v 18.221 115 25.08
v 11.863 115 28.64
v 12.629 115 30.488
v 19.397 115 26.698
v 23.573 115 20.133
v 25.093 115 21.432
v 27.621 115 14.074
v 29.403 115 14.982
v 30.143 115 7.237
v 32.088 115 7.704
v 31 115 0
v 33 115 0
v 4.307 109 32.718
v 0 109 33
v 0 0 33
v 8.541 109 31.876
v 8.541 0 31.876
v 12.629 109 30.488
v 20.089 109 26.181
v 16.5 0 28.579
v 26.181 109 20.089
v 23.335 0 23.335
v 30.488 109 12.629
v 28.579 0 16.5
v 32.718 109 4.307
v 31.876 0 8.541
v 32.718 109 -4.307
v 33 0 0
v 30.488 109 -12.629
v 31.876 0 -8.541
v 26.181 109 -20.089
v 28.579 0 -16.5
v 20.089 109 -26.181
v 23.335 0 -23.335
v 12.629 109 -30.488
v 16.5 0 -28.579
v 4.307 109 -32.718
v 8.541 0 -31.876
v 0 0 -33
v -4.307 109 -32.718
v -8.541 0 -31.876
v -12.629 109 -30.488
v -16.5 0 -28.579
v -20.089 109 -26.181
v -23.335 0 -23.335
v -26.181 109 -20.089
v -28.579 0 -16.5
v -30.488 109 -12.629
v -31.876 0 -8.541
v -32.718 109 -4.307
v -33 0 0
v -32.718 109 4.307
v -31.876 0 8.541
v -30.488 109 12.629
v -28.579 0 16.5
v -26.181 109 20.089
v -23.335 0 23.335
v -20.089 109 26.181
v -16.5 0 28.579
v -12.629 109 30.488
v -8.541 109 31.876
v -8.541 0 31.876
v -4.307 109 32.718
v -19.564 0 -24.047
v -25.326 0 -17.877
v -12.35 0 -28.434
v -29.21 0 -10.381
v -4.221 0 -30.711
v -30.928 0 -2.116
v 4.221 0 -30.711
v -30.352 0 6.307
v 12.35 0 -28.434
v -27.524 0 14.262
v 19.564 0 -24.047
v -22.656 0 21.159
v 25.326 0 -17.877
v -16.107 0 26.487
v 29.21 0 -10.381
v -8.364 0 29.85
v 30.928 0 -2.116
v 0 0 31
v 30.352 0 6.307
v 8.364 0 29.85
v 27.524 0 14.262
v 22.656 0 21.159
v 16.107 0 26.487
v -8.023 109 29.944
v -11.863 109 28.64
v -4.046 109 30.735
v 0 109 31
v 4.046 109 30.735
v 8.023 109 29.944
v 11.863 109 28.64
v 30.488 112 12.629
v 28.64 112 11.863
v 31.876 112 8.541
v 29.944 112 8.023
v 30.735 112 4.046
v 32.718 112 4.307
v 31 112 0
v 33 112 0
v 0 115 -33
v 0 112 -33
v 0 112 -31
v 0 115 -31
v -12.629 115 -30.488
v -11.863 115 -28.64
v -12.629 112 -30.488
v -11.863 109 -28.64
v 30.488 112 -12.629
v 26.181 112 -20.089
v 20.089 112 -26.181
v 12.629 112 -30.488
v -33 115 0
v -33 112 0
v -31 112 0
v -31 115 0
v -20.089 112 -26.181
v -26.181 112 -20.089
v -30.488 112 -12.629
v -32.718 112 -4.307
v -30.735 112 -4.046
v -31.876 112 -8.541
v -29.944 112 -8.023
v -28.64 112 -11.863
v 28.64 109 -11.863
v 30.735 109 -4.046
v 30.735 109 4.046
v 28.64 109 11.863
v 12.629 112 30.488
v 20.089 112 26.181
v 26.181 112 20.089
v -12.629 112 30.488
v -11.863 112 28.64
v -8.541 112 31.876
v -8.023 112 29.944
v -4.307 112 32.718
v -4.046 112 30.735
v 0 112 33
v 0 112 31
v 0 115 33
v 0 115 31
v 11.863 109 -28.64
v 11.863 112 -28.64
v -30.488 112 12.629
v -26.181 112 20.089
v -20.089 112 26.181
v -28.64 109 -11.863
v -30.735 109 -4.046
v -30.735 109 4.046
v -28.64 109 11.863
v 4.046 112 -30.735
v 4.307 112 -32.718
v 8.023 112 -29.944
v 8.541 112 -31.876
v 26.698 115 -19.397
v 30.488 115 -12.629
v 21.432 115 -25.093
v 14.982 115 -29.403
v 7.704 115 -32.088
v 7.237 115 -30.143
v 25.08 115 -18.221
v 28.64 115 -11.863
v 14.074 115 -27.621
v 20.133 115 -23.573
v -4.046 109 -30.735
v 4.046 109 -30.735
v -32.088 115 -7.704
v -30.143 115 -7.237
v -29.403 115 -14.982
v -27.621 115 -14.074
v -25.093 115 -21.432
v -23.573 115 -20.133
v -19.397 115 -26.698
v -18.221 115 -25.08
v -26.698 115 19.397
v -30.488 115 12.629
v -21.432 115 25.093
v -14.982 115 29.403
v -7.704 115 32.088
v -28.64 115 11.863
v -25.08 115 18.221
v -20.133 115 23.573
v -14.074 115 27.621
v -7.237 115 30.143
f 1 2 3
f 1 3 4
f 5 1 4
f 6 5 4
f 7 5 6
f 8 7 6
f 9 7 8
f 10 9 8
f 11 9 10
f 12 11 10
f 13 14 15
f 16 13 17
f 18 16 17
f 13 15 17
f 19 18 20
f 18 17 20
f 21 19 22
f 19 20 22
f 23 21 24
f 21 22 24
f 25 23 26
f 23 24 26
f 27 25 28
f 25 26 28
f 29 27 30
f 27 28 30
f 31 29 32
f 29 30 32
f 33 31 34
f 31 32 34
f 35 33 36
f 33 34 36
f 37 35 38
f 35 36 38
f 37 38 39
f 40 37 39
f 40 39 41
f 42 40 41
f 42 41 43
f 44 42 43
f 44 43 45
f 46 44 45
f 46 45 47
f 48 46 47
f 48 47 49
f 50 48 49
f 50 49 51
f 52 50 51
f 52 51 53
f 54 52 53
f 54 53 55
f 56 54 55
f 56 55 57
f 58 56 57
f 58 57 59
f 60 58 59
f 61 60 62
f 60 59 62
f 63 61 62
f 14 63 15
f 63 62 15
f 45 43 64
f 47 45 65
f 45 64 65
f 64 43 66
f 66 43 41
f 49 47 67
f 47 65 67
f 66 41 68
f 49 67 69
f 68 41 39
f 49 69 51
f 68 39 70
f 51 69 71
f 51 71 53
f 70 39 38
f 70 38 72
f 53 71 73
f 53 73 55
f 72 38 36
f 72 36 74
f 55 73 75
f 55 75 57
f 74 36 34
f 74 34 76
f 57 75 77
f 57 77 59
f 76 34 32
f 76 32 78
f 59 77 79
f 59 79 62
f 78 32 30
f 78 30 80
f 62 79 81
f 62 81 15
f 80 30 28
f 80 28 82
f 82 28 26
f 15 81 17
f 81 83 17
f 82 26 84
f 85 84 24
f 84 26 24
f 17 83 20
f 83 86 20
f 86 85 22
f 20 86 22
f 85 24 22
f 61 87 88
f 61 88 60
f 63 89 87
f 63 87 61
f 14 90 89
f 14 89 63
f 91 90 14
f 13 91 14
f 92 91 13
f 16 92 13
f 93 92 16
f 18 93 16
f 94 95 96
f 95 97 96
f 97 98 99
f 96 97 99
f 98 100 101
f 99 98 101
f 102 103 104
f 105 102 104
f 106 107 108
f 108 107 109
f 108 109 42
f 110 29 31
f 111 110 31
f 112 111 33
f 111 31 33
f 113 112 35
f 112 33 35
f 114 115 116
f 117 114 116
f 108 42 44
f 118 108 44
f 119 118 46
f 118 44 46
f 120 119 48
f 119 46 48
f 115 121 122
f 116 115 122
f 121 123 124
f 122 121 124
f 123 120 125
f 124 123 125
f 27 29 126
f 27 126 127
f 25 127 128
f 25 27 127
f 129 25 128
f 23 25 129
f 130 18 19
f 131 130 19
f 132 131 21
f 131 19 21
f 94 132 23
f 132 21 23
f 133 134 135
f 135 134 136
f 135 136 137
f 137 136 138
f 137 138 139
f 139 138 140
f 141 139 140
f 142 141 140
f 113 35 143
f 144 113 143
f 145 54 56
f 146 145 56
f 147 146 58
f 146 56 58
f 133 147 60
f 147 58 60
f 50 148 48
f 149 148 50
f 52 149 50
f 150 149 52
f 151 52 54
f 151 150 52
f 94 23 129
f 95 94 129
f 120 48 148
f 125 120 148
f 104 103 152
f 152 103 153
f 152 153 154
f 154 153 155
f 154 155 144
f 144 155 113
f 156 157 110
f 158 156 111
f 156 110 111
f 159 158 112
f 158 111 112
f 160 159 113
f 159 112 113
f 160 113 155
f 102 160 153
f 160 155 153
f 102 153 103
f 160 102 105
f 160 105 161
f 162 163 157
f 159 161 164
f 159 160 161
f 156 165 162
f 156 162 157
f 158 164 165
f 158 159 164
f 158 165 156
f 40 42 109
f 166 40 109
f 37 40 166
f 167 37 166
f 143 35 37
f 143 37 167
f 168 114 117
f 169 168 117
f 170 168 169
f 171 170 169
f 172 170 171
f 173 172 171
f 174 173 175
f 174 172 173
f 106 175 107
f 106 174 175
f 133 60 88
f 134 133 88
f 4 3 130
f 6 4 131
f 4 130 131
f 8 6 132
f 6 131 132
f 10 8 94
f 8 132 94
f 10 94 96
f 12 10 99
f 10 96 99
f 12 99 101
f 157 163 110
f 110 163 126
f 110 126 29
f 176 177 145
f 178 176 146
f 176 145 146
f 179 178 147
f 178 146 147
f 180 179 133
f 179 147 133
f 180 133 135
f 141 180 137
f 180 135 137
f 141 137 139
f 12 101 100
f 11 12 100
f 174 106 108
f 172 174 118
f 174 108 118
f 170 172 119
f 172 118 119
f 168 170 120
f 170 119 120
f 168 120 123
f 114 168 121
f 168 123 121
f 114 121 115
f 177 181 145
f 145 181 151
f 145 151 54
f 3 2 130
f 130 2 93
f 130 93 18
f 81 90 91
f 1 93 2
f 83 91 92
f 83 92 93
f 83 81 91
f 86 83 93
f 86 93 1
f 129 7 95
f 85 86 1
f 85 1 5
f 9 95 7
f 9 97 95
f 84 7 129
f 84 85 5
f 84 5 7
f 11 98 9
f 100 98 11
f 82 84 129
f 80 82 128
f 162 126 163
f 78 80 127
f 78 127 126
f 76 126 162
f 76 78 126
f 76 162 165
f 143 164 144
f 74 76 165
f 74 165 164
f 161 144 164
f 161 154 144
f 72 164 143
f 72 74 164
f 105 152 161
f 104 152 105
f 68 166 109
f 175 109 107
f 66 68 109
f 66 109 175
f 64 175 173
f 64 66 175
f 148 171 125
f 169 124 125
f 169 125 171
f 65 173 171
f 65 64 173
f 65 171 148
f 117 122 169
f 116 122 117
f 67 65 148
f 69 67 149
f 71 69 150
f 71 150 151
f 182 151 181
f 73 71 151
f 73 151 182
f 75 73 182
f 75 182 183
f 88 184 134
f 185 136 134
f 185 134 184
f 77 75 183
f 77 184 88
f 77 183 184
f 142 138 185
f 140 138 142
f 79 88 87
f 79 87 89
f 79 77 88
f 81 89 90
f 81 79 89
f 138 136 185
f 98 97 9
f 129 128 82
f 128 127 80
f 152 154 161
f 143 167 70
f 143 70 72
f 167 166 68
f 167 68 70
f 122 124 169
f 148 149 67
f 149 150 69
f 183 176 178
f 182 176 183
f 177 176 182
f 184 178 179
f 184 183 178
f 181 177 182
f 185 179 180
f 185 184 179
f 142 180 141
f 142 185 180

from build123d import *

# Parameters (mm, degrees)
SKETCH1_R           = 33
BOSS_EXTRUDE1_DEPTH = 109
SKETCH2_R           = 31
BOSS_EXTRUDE3_DEPTH = 3
BOSS_EXTRUDE4_DEPTH = 3
CUT_EXTRUDE1_START  = -115
SKETCH4_R           = 31
CUT_EXTRUDE1_DEPTH  = 115


with BuildPart() as part:
    # Sketch1 → Boss-Extrude1 (new body)
    with BuildSketch(Plane(origin=(0, 0, 0), x_dir=(1, 0, 0), z_dir=(0, 1, 0))):
        with Locations(Location((0, 0, 0), (0, 0, 270))):
            Circle(SKETCH1_R)
    extrude(amount=BOSS_EXTRUDE1_DEPTH)

    # Sketch2 → Boss-Extrude3 (add)
    with BuildSketch(Plane(origin=(0, 109, 0), x_dir=(1, 0, 0), z_dir=(0, 1, 0))):
        Circle(SKETCH2_R)
        with BuildLine():
            Line((-30.488024573, 12.628553268), (-28.640265508, 11.863186403))
            ThreePointArc((-28.640265508, 11.863186403), (-21.920310217, 21.920310217), (-11.863186403, 28.640265508))
            Line((-11.863186403, 28.640265508), (-12.628553268, 30.488024573))
            ThreePointArc((-12.628553268, 30.488024573), (-23.334523779, 23.334523779), (-30.488024573, 12.628553268))
        make_face()
        with BuildLine():
            ThreePointArc((11.863186403, 28.640265508), (21.920310217, 21.920310217), (28.640265508, 11.863186403))
            Line((28.640265508, 11.863186403), (30.488024573, 12.628553268))
            ThreePointArc((30.488024573, 12.628553268), (23.334523779, 23.334523779), (12.628553268, 30.488024573))
            Line((12.628553268, 30.488024573), (11.863186403, 28.640265508))
        make_face()
        with BuildLine():
            Line((30.488024573, -12.628553268), (28.640265508, -11.863186403))
            ThreePointArc((28.640265508, -11.863186403), (21.920310217, -21.920310217), (11.863186403, -28.640265508))
            Line((11.863186403, -28.640265508), (12.628553268, -30.488024573))
            ThreePointArc((12.628553268, -30.488024573), (23.334523779, -23.334523779), (30.488024573, -12.628553268))
        make_face()
        with BuildLine():
            Line((-12.628553268, -30.488024573), (-11.863186403, -28.640265508))
            ThreePointArc((-11.863186403, -28.640265508), (-21.920310217, -21.920310217), (-28.640265508, -11.863186403))
            Line((-28.640265508, -11.863186403), (-30.488024573, -12.628553268))
            ThreePointArc((-30.488024573, -12.628553268), (-23.334523779, -23.334523779), (-12.628553268, -30.488024573))
        make_face()
    extrude(amount=BOSS_EXTRUDE3_DEPTH)

    # Sketch3 → Boss-Extrude4 (add)
    with BuildSketch(Plane(origin=(0, 112, 0), x_dir=(1, 0, 0), z_dir=(0, 1, 0))):
        with BuildLine():
            Line((-33, 0), (-31, 0))
            ThreePointArc((-31, 0), (-30.404343693, -6.047799982), (-28.640265508, -11.863186403))
            Line((-28.640265508, -11.863186403), (-30.488024573, -12.628553268))
            ThreePointArc((-30.488024573, -12.628553268), (-18.33381769, -27.438497206), (0, -33))
            Line((0, -33), (0, -31))
            ThreePointArc((0, -31), (6.047799982, -30.404343693), (11.863186403, -28.640265508))
            Line((11.863186403, -28.640265508), (12.628553268, -30.488024573))
            ThreePointArc((12.628553268, -30.488024573), (27.438497206, -18.33381769), (33, 0))
            Line((33, 0), (31, 0))
            ThreePointArc((31, 0), (30.404343693, 6.047799982), (28.640265508, 11.863186403))
            Line((28.640265508, 11.863186403), (30.488024573, 12.628553268))
            ThreePointArc((30.488024573, 12.628553268), (18.33381769, 27.438497206), (0, 33))
            Line((0, 33), (0, 31))
            ThreePointArc((0, 31), (-6.047799982, 30.404343693), (-11.863186403, 28.640265508))
            Line((-11.863186403, 28.640265508), (-12.628553268, 30.488024573))
            ThreePointArc((-12.628553268, 30.488024573), (-27.438497206, 18.33381769), (-33, 0))
        make_face()
    extrude(amount=BOSS_EXTRUDE4_DEPTH)

    # Sketch4 → Cut-Extrude1 (cut)
    with BuildSketch(Plane(origin=(0, 115, 0), x_dir=(1, 0, 0), z_dir=(0, 1, 0)).offset(CUT_EXTRUDE1_START)):
        with Locations(Location((0, 0, 0), (0, 0, 270))):
            Circle(SKETCH4_R)
    extrude(amount=CUT_EXTRUDE1_DEPTH, mode=Mode.SUBTRACT)


solid = part.part
